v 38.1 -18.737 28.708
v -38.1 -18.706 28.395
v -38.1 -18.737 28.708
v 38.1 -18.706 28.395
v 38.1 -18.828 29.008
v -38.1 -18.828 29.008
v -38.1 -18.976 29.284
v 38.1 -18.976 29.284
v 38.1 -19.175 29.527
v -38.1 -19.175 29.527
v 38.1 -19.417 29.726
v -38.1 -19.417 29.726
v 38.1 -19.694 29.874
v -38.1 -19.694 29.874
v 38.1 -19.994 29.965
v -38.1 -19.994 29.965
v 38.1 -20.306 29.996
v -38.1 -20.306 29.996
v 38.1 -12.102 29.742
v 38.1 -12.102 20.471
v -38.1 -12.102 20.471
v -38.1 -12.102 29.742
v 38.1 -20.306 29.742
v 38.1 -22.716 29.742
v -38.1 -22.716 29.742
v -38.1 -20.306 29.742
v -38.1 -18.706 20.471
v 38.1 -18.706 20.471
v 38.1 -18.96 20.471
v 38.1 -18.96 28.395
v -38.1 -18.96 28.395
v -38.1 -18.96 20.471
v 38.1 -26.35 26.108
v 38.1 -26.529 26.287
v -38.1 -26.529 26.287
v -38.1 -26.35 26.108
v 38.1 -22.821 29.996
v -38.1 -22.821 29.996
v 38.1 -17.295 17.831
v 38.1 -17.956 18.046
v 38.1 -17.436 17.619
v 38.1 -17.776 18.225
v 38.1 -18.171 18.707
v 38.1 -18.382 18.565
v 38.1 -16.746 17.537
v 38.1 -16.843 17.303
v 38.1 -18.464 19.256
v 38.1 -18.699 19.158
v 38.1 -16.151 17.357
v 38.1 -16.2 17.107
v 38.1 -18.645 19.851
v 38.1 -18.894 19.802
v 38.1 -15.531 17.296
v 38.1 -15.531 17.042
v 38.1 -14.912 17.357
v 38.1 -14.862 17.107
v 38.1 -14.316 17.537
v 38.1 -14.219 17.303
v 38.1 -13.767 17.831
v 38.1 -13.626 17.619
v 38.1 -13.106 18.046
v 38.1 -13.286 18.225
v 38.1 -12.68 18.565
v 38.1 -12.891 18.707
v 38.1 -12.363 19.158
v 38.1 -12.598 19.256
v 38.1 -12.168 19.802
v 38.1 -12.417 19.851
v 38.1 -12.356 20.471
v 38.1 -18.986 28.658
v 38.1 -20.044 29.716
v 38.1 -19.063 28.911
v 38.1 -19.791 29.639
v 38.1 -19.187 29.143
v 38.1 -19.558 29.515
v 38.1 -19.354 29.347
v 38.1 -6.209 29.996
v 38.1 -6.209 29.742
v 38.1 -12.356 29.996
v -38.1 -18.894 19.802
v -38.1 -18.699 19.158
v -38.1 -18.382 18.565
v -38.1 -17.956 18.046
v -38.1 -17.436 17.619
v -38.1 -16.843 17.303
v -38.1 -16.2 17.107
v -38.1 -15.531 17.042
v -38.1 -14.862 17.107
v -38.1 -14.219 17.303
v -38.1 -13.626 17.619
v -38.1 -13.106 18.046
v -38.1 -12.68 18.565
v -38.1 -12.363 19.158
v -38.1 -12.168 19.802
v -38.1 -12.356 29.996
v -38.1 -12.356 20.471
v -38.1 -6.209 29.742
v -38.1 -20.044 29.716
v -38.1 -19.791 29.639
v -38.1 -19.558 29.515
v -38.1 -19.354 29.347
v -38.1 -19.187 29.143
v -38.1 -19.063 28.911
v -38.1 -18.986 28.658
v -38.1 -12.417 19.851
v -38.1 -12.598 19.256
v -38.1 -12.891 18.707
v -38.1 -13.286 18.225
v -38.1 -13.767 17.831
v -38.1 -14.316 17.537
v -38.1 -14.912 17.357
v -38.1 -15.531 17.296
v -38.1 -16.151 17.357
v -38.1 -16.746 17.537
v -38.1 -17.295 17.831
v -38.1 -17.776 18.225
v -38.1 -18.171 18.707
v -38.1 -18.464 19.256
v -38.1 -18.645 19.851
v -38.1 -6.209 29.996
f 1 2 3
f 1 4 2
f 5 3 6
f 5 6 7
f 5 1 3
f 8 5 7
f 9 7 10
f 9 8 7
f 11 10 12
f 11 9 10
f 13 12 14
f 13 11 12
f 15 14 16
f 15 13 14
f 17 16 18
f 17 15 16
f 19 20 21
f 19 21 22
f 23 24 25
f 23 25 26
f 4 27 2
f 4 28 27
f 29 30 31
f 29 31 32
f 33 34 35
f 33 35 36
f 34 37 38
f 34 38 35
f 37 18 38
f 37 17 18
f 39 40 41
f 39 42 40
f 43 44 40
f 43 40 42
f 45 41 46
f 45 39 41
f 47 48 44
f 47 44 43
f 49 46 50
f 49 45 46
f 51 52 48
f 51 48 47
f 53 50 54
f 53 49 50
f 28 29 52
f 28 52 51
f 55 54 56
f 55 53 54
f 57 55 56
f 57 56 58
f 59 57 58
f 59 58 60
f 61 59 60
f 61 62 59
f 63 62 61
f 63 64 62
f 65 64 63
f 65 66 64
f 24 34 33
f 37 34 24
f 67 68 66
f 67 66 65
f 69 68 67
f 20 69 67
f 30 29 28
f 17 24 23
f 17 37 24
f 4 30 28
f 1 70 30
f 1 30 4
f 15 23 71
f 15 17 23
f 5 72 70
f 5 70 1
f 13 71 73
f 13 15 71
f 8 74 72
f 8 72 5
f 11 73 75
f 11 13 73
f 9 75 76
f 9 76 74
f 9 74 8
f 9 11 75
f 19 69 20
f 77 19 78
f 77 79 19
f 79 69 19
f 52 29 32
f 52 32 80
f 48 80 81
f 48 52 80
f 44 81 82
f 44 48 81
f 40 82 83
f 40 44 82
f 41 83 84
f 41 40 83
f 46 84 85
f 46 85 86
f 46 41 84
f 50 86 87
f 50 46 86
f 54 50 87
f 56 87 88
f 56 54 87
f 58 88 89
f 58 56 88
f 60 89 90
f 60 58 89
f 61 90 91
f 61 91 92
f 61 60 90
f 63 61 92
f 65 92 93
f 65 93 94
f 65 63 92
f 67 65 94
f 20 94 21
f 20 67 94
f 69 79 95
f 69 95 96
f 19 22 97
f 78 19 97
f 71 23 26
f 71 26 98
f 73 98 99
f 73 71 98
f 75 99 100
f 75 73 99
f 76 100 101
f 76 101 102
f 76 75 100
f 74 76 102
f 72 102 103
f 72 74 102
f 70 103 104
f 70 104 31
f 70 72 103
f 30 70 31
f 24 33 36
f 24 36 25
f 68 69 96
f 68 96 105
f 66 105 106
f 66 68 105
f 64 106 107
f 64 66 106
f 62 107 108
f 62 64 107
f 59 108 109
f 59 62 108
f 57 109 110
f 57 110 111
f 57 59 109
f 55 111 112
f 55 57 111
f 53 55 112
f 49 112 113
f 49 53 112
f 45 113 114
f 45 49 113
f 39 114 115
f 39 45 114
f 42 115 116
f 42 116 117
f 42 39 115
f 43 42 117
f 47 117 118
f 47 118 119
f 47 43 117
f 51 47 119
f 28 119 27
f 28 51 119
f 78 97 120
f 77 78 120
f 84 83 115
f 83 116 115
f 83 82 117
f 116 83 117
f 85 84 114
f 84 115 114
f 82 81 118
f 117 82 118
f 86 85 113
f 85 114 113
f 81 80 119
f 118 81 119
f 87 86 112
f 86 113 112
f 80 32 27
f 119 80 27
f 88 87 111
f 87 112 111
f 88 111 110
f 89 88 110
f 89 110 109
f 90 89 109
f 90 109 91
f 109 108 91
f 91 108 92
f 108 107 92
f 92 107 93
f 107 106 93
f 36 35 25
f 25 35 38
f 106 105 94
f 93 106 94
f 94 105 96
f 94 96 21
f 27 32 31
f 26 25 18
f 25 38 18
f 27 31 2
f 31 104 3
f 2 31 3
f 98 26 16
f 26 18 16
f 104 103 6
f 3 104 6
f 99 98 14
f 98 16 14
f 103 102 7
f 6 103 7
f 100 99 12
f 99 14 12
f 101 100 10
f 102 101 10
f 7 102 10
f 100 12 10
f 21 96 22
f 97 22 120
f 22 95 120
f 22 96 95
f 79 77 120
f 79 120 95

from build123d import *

# Parameters (mm, degrees)
F1_DEPTH = 38.1


with BuildPart() as f1:
    # F0 (on Right) → F1 (new body, symmetric)
    with BuildSketch(Plane.YZ):
        with BuildLine():
            Line((-20.306327, 29.995541), (-22.820927, 29.995541))
            Line((-22.820927, 29.995541), (-26.529327, 26.287141))
            Line((-26.529327, 26.287141), (-26.349722, 26.107536))
            Line((-26.349722, 26.107536), (-22.715717, 29.741541))
            Line((-22.715717, 29.741541), (-20.306327, 29.741541))
            ThreePointArc((-20.306327, 29.741541), (-19.35442, 29.347248), (-18.960127, 28.395341))
            Line((-18.960127, 28.395341), (-18.960127, 20.470541))
            ThreePointArc((-18.960127, 20.470541), (-15.531127, 17.041541), (-12.102127, 20.470541))
            Line((-12.102127, 20.470541), (-12.102127, 29.741541))
            Line((-12.102127, 29.741541), (-6.209327, 29.741541))
            Line((-6.209327, 29.741541), (-6.209327, 29.995541))
            Line((-6.209327, 29.995541), (-12.356127, 29.995541))
            Line((-12.356127, 29.995541), (-12.356127, 20.470541))
            ThreePointArc((-12.356127, 20.470541), (-15.531127, 17.295541), (-18.706127, 20.470541))
            Line((-18.706127, 20.470541), (-18.706127, 28.395341))
            ThreePointArc((-18.706127, 28.395341), (-19.174815, 29.526853), (-20.306327, 29.995541))
        make_face()
    extrude(amount=F1_DEPTH, both=True)


solid = f1.part
